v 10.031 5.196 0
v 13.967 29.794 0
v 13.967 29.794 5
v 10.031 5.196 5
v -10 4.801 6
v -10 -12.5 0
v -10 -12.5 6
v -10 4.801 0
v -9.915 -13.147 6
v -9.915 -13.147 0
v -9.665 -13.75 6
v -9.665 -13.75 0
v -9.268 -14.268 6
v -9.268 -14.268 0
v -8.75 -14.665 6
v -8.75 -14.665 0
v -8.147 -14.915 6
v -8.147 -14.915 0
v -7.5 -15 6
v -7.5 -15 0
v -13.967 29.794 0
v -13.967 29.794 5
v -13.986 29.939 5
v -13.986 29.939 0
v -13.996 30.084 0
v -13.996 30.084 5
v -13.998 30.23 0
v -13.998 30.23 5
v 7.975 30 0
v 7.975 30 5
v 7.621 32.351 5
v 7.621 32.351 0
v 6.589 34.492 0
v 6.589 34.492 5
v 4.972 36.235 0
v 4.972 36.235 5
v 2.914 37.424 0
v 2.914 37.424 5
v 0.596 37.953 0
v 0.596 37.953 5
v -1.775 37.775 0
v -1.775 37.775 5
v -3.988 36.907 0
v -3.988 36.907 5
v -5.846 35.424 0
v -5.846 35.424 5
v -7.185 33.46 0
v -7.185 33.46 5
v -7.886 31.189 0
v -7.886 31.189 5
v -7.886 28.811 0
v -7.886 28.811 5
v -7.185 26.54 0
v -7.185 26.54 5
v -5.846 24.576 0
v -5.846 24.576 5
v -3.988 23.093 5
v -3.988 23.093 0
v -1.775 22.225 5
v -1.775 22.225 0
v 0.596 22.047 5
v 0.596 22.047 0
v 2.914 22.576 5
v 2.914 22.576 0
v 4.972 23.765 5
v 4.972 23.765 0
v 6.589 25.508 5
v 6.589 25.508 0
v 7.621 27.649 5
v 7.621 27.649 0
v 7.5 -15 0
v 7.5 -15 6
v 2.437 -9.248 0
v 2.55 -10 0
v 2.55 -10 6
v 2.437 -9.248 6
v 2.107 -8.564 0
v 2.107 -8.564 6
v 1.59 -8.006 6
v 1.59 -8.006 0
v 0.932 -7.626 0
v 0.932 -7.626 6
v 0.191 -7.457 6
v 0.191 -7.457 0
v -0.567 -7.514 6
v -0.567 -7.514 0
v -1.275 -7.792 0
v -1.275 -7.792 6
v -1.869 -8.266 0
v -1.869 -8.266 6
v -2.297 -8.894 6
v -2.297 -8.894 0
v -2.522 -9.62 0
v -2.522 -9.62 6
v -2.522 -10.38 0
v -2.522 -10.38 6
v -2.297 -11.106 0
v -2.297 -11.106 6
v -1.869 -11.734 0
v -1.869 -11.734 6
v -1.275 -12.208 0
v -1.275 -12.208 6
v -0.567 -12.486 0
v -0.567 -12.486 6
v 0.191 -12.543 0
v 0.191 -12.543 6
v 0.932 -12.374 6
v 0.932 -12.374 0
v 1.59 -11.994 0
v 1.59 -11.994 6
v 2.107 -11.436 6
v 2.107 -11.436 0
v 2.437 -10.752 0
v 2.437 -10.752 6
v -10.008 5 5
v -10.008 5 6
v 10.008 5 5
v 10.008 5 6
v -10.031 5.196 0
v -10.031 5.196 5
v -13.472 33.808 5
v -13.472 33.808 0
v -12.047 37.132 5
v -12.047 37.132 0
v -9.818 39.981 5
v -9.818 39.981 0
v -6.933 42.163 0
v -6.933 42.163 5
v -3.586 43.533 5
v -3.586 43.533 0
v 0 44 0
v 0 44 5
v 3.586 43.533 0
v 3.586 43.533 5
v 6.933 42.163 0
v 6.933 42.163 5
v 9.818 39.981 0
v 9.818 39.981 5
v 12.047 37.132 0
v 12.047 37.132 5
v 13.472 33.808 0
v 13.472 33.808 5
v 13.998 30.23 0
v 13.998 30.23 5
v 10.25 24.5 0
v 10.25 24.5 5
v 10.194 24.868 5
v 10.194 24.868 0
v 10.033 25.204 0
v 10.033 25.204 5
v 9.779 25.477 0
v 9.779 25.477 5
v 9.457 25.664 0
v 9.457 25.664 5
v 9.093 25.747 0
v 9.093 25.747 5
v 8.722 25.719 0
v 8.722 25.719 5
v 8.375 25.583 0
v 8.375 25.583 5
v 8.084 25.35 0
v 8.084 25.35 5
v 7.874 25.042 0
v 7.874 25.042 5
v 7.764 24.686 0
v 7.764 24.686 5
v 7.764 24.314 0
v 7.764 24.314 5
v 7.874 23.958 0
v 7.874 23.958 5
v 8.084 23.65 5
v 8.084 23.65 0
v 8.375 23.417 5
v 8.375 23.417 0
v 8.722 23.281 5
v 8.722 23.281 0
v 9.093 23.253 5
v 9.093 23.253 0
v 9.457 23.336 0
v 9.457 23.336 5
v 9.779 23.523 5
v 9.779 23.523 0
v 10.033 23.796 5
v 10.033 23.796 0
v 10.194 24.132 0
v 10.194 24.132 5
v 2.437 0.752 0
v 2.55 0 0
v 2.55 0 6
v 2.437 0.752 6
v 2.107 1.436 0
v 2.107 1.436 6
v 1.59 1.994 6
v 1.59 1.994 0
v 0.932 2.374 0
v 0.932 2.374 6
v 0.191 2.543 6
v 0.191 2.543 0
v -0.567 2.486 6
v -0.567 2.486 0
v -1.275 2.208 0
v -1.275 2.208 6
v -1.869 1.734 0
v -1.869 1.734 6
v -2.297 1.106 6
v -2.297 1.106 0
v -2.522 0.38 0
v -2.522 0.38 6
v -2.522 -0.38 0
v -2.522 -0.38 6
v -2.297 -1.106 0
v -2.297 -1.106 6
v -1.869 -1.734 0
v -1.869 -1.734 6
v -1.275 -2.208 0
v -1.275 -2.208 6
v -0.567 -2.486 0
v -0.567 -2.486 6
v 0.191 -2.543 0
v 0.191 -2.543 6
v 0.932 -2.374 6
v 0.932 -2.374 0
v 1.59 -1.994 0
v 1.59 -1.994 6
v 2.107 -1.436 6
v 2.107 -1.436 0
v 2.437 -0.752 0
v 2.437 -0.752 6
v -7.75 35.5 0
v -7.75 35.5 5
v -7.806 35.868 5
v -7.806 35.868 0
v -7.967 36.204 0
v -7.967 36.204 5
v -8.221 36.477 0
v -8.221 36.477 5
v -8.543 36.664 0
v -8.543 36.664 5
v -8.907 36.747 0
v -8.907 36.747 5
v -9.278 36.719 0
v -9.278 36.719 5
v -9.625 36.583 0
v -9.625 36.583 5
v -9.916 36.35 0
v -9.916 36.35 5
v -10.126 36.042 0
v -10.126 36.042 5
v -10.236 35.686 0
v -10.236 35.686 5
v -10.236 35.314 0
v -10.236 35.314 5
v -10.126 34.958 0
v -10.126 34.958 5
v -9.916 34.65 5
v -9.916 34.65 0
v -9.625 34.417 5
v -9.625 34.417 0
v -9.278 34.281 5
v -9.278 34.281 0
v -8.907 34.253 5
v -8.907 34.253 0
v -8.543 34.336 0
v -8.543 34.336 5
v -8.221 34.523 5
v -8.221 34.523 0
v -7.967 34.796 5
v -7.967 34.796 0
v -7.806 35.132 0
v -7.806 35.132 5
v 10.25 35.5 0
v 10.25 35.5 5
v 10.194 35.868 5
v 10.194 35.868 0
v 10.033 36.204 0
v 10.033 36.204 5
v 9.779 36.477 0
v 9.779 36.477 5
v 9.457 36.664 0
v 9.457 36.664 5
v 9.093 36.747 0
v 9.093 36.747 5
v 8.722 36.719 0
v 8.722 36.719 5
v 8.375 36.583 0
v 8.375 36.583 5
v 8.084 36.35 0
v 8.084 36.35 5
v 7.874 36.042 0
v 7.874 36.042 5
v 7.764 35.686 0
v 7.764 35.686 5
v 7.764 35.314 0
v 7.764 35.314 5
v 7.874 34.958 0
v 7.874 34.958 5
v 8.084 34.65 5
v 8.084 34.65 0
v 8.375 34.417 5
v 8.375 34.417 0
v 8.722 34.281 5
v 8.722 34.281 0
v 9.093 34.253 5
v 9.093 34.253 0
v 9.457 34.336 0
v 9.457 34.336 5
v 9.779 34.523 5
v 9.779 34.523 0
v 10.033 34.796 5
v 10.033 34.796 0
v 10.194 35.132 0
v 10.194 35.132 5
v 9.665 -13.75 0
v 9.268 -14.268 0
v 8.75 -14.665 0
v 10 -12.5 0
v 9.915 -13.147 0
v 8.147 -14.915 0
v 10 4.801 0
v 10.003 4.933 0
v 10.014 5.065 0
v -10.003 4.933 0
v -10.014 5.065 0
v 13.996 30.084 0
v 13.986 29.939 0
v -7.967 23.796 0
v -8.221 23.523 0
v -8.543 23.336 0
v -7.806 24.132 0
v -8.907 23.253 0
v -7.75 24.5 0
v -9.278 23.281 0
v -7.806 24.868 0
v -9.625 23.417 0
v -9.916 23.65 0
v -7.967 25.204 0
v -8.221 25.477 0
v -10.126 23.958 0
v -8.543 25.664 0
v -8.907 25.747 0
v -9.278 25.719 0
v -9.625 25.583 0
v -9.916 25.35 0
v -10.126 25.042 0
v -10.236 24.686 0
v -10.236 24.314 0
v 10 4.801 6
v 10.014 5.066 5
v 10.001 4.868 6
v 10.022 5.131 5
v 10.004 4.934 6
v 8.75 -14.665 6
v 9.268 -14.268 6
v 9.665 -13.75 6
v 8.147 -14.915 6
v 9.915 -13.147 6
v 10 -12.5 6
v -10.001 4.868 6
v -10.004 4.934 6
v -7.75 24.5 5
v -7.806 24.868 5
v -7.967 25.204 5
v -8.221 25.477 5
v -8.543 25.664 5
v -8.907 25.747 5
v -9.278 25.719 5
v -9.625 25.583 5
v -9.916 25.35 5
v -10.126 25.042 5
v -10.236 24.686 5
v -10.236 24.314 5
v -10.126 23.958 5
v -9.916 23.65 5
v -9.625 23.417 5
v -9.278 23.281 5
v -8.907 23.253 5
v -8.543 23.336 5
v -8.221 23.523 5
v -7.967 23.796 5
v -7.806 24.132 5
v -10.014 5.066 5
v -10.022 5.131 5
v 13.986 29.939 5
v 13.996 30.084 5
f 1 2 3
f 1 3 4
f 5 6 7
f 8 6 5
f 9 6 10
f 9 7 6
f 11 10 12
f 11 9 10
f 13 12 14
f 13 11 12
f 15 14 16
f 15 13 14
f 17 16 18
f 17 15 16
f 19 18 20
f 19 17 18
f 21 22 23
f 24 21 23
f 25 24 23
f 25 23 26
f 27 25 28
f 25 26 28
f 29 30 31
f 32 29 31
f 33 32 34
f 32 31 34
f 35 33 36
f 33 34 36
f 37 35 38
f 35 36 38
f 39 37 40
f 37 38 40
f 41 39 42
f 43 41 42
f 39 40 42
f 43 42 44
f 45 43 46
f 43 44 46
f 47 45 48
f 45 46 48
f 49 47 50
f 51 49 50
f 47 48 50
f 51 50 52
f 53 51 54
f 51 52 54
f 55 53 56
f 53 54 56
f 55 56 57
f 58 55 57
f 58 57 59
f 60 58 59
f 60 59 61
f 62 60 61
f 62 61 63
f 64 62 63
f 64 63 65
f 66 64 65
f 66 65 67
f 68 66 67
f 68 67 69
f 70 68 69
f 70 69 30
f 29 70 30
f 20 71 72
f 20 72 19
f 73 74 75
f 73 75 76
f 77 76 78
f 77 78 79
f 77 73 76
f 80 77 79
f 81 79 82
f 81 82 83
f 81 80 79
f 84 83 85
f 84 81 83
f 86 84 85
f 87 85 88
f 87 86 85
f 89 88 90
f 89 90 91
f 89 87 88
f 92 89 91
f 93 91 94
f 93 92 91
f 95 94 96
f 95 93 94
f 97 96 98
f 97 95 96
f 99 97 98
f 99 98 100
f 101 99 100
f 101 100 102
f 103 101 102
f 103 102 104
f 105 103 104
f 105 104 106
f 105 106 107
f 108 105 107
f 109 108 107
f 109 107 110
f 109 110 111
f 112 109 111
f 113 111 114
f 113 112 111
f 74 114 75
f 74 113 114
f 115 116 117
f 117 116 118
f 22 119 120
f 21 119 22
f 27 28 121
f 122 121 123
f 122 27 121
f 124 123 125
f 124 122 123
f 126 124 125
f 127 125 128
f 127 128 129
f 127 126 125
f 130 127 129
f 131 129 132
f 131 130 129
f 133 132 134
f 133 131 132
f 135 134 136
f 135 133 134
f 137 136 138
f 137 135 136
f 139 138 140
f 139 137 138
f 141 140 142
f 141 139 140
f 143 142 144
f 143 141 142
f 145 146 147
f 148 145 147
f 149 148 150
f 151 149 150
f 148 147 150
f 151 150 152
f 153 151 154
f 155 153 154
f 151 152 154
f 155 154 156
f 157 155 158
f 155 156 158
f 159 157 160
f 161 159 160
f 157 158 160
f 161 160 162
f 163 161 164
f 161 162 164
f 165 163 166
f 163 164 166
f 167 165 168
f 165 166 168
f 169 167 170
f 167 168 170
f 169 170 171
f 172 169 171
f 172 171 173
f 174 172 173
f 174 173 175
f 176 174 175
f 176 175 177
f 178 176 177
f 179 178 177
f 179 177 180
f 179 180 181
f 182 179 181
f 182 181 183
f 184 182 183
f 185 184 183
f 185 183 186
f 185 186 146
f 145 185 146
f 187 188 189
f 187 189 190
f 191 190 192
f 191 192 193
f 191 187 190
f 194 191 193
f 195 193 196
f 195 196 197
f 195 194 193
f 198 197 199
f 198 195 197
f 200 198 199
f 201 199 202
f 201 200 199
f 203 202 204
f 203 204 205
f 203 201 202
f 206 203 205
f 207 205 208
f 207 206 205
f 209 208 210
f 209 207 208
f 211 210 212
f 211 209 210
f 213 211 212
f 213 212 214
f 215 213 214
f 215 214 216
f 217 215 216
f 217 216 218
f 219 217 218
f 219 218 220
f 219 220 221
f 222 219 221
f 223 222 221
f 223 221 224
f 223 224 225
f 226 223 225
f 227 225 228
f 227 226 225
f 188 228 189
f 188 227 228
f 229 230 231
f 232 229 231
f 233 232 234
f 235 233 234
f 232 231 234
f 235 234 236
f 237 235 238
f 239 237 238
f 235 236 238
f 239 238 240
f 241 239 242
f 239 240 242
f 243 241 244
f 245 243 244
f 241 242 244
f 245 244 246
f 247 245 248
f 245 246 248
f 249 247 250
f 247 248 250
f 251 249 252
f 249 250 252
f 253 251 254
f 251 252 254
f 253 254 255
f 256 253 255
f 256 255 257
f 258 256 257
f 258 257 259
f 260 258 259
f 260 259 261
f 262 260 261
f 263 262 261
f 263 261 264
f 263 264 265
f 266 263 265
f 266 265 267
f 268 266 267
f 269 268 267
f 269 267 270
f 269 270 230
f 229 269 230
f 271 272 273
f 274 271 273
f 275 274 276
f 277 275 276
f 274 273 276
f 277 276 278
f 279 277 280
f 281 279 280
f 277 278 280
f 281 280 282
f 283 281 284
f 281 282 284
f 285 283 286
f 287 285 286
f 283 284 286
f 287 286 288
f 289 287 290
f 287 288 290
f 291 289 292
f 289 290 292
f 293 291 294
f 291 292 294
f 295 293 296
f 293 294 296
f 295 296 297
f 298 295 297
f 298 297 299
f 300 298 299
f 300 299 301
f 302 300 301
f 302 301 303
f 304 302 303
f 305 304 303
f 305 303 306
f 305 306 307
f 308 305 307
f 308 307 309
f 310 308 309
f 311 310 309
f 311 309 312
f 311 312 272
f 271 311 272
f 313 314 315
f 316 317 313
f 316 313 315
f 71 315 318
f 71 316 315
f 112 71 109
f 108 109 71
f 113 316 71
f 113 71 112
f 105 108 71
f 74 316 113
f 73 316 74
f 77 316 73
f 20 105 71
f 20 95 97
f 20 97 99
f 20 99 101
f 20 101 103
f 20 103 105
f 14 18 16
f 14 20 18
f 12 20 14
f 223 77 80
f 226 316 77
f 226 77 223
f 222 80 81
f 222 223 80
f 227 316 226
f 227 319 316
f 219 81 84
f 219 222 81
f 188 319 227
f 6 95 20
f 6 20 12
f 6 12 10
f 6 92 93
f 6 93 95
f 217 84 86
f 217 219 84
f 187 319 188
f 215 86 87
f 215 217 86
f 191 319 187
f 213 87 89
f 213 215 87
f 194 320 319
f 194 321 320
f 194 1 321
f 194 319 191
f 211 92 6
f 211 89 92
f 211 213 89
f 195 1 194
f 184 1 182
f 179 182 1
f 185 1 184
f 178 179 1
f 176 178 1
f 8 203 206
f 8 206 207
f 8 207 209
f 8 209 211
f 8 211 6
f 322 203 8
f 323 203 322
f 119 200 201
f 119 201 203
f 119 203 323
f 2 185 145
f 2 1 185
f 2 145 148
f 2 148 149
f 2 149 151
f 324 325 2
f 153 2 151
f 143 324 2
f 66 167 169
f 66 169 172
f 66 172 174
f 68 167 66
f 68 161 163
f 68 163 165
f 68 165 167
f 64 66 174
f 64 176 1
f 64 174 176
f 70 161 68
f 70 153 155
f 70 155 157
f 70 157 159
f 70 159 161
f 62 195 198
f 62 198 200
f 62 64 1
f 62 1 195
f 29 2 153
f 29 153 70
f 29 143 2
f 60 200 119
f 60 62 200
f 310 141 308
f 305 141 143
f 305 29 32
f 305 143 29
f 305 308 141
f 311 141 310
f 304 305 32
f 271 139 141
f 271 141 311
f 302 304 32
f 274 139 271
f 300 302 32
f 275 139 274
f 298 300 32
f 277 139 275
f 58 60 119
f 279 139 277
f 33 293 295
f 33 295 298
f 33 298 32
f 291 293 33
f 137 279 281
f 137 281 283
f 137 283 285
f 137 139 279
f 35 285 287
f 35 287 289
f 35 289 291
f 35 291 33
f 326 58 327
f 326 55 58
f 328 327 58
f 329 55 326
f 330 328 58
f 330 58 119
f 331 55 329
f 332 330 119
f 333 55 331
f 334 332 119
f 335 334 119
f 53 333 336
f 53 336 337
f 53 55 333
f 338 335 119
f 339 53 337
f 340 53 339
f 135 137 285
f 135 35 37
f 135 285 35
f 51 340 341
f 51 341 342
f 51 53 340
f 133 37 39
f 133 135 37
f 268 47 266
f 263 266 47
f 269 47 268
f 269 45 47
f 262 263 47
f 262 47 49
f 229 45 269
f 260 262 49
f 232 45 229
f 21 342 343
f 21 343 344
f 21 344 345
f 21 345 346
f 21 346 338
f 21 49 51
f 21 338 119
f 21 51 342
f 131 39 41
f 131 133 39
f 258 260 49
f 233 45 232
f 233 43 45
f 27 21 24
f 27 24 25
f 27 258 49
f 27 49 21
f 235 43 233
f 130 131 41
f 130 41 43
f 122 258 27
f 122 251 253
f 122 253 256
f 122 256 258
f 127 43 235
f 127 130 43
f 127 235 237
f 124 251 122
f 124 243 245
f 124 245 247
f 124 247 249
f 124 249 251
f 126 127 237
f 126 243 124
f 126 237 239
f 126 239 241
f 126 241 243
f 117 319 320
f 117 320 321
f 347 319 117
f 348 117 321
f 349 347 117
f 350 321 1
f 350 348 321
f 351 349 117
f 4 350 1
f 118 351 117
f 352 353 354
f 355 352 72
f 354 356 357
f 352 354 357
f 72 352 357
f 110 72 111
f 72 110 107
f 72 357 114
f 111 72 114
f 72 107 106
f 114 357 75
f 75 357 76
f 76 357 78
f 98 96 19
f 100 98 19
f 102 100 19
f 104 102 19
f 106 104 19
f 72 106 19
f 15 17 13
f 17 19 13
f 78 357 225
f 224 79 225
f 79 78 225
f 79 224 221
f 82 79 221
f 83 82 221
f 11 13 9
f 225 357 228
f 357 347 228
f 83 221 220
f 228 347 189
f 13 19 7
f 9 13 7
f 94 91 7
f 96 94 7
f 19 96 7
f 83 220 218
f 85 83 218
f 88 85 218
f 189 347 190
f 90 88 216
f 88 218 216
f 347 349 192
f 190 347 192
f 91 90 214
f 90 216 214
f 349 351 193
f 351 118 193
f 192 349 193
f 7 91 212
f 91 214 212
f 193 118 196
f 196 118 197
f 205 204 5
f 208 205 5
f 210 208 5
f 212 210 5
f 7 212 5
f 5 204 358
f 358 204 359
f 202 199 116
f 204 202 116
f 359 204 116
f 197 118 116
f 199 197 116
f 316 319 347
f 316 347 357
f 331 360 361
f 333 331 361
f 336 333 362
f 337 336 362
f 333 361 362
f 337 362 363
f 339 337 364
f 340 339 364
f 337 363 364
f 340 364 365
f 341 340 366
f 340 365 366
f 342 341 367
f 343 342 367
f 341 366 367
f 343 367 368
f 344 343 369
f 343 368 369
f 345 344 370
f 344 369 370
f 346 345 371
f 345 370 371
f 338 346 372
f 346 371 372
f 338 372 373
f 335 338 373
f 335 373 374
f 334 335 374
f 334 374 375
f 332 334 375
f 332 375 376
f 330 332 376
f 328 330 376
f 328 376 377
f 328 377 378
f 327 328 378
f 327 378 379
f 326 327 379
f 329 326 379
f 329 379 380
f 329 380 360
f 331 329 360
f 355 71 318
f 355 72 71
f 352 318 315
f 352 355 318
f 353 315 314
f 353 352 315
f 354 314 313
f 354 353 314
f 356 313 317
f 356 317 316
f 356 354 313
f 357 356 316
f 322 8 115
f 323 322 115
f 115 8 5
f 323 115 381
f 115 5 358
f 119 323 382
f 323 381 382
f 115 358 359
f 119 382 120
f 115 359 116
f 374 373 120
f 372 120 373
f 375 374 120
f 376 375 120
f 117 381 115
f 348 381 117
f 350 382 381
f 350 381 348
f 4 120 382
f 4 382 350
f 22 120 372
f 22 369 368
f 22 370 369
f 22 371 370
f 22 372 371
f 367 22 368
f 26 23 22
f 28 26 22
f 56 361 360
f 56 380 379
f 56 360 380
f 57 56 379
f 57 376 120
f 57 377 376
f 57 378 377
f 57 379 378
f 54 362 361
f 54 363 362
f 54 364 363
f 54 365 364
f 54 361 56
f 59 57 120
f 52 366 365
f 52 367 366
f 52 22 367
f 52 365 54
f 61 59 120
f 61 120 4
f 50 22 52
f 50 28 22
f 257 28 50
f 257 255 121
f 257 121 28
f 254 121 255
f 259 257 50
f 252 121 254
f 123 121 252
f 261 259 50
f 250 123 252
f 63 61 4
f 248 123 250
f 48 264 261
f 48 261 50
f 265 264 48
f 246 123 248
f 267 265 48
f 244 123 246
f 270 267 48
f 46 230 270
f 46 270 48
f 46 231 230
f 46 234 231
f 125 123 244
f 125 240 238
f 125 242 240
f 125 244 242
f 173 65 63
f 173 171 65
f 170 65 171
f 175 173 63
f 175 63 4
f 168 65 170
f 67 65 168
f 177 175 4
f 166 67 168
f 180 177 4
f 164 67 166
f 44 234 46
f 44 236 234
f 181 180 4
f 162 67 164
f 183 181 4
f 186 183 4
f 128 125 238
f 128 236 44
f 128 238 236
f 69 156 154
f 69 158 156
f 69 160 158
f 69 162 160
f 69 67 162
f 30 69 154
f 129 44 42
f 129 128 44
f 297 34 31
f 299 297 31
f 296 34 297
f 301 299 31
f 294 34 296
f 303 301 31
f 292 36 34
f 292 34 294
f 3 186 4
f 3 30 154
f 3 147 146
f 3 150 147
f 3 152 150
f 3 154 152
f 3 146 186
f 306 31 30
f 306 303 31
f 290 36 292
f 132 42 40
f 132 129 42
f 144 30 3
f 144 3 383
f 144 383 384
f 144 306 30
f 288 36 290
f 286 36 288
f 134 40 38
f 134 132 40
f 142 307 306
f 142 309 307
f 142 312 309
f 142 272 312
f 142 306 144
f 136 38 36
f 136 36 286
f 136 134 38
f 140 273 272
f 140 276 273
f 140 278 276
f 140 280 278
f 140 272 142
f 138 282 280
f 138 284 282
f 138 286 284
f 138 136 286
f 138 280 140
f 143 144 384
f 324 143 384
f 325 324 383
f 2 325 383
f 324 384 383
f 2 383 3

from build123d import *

# Parameters (mm, degrees)
SKETCH1_R           = 2.55
BOSS_EXTRUDE2_DEPTH = 6
FILLET1_R           = 2.5
SKETCH3_R           = 7.975
CUT_EXTRUDE2_DEPTH  = 47.561319795
SKETCH2_R           = 1.25
CUT_EXTRUDE1_DEPTH  = 47.561319795
SKETCH6_W           = 40
SKETCH6_H           = 50
CUT_EXTRUDE5_DEPTH  = 1


with BuildPart() as part:
    # Sketch1 → Boss-Extrude2 (new body)
    with BuildSketch(Plane.XY):
        with BuildLine():
            Line((-10, -15), (-10, 5))
            Line((-10, 5), (-14, 30))
            ThreePointArc((-14, 30), (0, 44), (14, 30))
            Line((14, 30), (10, 5))
            Line((10, 5), (10, -15))
            Line((10, -15), (-10, -15))
        make_face()
        Circle(SKETCH1_R, mode=Mode.SUBTRACT)
        with Locations((0, -10)):
            Circle(SKETCH1_R, mode=Mode.SUBTRACT)
    extrude(amount=BOSS_EXTRUDE2_DEPTH)

    # Fillet1
    fillet1_edges = [part.edges().sort_by_distance(p)[0] for p in [
        (14, 30, 3),
        (10, 5, 3),
        (10, -15, 3),
        (-10, -15, 3),
        (-10, 5, 3),
        (-14, 30, 3),
    ]]
    fillet(fillet1_edges, radius=FILLET1_R)

    # Sketch3 → Cut-Extrude2 (cut, through all)
    with BuildSketch(Plane.XY.offset(6)):
        with Locations((0, 30)):
            Circle(SKETCH3_R)
    extrude(amount=-CUT_EXTRUDE2_DEPTH, mode=Mode.SUBTRACT)

    # Sketch2 → Cut-Extrude1 (cut, through all)
    with BuildSketch(Plane.XY.offset(6)):
        with Locations((-9, 24.5)):
            Circle(SKETCH2_R)
        with Locations((9, 24.5)):
            Circle(SKETCH2_R)
        with Locations((-9, 35.5)):
            Circle(SKETCH2_R)
        with Locations((9, 35.5)):
            Circle(SKETCH2_R)
    extrude(amount=-CUT_EXTRUDE1_DEPTH, mode=Mode.SUBTRACT)

    # Sketch6 → Cut-Extrude5 (cut)
    with BuildSketch(Plane.XY.offset(6)):
        with Locations((0, 30)):
            Rectangle(SKETCH6_W, SKETCH6_H)
    extrude(amount=-CUT_EXTRUDE5_DEPTH, mode=Mode.SUBTRACT)


solid = part.part
